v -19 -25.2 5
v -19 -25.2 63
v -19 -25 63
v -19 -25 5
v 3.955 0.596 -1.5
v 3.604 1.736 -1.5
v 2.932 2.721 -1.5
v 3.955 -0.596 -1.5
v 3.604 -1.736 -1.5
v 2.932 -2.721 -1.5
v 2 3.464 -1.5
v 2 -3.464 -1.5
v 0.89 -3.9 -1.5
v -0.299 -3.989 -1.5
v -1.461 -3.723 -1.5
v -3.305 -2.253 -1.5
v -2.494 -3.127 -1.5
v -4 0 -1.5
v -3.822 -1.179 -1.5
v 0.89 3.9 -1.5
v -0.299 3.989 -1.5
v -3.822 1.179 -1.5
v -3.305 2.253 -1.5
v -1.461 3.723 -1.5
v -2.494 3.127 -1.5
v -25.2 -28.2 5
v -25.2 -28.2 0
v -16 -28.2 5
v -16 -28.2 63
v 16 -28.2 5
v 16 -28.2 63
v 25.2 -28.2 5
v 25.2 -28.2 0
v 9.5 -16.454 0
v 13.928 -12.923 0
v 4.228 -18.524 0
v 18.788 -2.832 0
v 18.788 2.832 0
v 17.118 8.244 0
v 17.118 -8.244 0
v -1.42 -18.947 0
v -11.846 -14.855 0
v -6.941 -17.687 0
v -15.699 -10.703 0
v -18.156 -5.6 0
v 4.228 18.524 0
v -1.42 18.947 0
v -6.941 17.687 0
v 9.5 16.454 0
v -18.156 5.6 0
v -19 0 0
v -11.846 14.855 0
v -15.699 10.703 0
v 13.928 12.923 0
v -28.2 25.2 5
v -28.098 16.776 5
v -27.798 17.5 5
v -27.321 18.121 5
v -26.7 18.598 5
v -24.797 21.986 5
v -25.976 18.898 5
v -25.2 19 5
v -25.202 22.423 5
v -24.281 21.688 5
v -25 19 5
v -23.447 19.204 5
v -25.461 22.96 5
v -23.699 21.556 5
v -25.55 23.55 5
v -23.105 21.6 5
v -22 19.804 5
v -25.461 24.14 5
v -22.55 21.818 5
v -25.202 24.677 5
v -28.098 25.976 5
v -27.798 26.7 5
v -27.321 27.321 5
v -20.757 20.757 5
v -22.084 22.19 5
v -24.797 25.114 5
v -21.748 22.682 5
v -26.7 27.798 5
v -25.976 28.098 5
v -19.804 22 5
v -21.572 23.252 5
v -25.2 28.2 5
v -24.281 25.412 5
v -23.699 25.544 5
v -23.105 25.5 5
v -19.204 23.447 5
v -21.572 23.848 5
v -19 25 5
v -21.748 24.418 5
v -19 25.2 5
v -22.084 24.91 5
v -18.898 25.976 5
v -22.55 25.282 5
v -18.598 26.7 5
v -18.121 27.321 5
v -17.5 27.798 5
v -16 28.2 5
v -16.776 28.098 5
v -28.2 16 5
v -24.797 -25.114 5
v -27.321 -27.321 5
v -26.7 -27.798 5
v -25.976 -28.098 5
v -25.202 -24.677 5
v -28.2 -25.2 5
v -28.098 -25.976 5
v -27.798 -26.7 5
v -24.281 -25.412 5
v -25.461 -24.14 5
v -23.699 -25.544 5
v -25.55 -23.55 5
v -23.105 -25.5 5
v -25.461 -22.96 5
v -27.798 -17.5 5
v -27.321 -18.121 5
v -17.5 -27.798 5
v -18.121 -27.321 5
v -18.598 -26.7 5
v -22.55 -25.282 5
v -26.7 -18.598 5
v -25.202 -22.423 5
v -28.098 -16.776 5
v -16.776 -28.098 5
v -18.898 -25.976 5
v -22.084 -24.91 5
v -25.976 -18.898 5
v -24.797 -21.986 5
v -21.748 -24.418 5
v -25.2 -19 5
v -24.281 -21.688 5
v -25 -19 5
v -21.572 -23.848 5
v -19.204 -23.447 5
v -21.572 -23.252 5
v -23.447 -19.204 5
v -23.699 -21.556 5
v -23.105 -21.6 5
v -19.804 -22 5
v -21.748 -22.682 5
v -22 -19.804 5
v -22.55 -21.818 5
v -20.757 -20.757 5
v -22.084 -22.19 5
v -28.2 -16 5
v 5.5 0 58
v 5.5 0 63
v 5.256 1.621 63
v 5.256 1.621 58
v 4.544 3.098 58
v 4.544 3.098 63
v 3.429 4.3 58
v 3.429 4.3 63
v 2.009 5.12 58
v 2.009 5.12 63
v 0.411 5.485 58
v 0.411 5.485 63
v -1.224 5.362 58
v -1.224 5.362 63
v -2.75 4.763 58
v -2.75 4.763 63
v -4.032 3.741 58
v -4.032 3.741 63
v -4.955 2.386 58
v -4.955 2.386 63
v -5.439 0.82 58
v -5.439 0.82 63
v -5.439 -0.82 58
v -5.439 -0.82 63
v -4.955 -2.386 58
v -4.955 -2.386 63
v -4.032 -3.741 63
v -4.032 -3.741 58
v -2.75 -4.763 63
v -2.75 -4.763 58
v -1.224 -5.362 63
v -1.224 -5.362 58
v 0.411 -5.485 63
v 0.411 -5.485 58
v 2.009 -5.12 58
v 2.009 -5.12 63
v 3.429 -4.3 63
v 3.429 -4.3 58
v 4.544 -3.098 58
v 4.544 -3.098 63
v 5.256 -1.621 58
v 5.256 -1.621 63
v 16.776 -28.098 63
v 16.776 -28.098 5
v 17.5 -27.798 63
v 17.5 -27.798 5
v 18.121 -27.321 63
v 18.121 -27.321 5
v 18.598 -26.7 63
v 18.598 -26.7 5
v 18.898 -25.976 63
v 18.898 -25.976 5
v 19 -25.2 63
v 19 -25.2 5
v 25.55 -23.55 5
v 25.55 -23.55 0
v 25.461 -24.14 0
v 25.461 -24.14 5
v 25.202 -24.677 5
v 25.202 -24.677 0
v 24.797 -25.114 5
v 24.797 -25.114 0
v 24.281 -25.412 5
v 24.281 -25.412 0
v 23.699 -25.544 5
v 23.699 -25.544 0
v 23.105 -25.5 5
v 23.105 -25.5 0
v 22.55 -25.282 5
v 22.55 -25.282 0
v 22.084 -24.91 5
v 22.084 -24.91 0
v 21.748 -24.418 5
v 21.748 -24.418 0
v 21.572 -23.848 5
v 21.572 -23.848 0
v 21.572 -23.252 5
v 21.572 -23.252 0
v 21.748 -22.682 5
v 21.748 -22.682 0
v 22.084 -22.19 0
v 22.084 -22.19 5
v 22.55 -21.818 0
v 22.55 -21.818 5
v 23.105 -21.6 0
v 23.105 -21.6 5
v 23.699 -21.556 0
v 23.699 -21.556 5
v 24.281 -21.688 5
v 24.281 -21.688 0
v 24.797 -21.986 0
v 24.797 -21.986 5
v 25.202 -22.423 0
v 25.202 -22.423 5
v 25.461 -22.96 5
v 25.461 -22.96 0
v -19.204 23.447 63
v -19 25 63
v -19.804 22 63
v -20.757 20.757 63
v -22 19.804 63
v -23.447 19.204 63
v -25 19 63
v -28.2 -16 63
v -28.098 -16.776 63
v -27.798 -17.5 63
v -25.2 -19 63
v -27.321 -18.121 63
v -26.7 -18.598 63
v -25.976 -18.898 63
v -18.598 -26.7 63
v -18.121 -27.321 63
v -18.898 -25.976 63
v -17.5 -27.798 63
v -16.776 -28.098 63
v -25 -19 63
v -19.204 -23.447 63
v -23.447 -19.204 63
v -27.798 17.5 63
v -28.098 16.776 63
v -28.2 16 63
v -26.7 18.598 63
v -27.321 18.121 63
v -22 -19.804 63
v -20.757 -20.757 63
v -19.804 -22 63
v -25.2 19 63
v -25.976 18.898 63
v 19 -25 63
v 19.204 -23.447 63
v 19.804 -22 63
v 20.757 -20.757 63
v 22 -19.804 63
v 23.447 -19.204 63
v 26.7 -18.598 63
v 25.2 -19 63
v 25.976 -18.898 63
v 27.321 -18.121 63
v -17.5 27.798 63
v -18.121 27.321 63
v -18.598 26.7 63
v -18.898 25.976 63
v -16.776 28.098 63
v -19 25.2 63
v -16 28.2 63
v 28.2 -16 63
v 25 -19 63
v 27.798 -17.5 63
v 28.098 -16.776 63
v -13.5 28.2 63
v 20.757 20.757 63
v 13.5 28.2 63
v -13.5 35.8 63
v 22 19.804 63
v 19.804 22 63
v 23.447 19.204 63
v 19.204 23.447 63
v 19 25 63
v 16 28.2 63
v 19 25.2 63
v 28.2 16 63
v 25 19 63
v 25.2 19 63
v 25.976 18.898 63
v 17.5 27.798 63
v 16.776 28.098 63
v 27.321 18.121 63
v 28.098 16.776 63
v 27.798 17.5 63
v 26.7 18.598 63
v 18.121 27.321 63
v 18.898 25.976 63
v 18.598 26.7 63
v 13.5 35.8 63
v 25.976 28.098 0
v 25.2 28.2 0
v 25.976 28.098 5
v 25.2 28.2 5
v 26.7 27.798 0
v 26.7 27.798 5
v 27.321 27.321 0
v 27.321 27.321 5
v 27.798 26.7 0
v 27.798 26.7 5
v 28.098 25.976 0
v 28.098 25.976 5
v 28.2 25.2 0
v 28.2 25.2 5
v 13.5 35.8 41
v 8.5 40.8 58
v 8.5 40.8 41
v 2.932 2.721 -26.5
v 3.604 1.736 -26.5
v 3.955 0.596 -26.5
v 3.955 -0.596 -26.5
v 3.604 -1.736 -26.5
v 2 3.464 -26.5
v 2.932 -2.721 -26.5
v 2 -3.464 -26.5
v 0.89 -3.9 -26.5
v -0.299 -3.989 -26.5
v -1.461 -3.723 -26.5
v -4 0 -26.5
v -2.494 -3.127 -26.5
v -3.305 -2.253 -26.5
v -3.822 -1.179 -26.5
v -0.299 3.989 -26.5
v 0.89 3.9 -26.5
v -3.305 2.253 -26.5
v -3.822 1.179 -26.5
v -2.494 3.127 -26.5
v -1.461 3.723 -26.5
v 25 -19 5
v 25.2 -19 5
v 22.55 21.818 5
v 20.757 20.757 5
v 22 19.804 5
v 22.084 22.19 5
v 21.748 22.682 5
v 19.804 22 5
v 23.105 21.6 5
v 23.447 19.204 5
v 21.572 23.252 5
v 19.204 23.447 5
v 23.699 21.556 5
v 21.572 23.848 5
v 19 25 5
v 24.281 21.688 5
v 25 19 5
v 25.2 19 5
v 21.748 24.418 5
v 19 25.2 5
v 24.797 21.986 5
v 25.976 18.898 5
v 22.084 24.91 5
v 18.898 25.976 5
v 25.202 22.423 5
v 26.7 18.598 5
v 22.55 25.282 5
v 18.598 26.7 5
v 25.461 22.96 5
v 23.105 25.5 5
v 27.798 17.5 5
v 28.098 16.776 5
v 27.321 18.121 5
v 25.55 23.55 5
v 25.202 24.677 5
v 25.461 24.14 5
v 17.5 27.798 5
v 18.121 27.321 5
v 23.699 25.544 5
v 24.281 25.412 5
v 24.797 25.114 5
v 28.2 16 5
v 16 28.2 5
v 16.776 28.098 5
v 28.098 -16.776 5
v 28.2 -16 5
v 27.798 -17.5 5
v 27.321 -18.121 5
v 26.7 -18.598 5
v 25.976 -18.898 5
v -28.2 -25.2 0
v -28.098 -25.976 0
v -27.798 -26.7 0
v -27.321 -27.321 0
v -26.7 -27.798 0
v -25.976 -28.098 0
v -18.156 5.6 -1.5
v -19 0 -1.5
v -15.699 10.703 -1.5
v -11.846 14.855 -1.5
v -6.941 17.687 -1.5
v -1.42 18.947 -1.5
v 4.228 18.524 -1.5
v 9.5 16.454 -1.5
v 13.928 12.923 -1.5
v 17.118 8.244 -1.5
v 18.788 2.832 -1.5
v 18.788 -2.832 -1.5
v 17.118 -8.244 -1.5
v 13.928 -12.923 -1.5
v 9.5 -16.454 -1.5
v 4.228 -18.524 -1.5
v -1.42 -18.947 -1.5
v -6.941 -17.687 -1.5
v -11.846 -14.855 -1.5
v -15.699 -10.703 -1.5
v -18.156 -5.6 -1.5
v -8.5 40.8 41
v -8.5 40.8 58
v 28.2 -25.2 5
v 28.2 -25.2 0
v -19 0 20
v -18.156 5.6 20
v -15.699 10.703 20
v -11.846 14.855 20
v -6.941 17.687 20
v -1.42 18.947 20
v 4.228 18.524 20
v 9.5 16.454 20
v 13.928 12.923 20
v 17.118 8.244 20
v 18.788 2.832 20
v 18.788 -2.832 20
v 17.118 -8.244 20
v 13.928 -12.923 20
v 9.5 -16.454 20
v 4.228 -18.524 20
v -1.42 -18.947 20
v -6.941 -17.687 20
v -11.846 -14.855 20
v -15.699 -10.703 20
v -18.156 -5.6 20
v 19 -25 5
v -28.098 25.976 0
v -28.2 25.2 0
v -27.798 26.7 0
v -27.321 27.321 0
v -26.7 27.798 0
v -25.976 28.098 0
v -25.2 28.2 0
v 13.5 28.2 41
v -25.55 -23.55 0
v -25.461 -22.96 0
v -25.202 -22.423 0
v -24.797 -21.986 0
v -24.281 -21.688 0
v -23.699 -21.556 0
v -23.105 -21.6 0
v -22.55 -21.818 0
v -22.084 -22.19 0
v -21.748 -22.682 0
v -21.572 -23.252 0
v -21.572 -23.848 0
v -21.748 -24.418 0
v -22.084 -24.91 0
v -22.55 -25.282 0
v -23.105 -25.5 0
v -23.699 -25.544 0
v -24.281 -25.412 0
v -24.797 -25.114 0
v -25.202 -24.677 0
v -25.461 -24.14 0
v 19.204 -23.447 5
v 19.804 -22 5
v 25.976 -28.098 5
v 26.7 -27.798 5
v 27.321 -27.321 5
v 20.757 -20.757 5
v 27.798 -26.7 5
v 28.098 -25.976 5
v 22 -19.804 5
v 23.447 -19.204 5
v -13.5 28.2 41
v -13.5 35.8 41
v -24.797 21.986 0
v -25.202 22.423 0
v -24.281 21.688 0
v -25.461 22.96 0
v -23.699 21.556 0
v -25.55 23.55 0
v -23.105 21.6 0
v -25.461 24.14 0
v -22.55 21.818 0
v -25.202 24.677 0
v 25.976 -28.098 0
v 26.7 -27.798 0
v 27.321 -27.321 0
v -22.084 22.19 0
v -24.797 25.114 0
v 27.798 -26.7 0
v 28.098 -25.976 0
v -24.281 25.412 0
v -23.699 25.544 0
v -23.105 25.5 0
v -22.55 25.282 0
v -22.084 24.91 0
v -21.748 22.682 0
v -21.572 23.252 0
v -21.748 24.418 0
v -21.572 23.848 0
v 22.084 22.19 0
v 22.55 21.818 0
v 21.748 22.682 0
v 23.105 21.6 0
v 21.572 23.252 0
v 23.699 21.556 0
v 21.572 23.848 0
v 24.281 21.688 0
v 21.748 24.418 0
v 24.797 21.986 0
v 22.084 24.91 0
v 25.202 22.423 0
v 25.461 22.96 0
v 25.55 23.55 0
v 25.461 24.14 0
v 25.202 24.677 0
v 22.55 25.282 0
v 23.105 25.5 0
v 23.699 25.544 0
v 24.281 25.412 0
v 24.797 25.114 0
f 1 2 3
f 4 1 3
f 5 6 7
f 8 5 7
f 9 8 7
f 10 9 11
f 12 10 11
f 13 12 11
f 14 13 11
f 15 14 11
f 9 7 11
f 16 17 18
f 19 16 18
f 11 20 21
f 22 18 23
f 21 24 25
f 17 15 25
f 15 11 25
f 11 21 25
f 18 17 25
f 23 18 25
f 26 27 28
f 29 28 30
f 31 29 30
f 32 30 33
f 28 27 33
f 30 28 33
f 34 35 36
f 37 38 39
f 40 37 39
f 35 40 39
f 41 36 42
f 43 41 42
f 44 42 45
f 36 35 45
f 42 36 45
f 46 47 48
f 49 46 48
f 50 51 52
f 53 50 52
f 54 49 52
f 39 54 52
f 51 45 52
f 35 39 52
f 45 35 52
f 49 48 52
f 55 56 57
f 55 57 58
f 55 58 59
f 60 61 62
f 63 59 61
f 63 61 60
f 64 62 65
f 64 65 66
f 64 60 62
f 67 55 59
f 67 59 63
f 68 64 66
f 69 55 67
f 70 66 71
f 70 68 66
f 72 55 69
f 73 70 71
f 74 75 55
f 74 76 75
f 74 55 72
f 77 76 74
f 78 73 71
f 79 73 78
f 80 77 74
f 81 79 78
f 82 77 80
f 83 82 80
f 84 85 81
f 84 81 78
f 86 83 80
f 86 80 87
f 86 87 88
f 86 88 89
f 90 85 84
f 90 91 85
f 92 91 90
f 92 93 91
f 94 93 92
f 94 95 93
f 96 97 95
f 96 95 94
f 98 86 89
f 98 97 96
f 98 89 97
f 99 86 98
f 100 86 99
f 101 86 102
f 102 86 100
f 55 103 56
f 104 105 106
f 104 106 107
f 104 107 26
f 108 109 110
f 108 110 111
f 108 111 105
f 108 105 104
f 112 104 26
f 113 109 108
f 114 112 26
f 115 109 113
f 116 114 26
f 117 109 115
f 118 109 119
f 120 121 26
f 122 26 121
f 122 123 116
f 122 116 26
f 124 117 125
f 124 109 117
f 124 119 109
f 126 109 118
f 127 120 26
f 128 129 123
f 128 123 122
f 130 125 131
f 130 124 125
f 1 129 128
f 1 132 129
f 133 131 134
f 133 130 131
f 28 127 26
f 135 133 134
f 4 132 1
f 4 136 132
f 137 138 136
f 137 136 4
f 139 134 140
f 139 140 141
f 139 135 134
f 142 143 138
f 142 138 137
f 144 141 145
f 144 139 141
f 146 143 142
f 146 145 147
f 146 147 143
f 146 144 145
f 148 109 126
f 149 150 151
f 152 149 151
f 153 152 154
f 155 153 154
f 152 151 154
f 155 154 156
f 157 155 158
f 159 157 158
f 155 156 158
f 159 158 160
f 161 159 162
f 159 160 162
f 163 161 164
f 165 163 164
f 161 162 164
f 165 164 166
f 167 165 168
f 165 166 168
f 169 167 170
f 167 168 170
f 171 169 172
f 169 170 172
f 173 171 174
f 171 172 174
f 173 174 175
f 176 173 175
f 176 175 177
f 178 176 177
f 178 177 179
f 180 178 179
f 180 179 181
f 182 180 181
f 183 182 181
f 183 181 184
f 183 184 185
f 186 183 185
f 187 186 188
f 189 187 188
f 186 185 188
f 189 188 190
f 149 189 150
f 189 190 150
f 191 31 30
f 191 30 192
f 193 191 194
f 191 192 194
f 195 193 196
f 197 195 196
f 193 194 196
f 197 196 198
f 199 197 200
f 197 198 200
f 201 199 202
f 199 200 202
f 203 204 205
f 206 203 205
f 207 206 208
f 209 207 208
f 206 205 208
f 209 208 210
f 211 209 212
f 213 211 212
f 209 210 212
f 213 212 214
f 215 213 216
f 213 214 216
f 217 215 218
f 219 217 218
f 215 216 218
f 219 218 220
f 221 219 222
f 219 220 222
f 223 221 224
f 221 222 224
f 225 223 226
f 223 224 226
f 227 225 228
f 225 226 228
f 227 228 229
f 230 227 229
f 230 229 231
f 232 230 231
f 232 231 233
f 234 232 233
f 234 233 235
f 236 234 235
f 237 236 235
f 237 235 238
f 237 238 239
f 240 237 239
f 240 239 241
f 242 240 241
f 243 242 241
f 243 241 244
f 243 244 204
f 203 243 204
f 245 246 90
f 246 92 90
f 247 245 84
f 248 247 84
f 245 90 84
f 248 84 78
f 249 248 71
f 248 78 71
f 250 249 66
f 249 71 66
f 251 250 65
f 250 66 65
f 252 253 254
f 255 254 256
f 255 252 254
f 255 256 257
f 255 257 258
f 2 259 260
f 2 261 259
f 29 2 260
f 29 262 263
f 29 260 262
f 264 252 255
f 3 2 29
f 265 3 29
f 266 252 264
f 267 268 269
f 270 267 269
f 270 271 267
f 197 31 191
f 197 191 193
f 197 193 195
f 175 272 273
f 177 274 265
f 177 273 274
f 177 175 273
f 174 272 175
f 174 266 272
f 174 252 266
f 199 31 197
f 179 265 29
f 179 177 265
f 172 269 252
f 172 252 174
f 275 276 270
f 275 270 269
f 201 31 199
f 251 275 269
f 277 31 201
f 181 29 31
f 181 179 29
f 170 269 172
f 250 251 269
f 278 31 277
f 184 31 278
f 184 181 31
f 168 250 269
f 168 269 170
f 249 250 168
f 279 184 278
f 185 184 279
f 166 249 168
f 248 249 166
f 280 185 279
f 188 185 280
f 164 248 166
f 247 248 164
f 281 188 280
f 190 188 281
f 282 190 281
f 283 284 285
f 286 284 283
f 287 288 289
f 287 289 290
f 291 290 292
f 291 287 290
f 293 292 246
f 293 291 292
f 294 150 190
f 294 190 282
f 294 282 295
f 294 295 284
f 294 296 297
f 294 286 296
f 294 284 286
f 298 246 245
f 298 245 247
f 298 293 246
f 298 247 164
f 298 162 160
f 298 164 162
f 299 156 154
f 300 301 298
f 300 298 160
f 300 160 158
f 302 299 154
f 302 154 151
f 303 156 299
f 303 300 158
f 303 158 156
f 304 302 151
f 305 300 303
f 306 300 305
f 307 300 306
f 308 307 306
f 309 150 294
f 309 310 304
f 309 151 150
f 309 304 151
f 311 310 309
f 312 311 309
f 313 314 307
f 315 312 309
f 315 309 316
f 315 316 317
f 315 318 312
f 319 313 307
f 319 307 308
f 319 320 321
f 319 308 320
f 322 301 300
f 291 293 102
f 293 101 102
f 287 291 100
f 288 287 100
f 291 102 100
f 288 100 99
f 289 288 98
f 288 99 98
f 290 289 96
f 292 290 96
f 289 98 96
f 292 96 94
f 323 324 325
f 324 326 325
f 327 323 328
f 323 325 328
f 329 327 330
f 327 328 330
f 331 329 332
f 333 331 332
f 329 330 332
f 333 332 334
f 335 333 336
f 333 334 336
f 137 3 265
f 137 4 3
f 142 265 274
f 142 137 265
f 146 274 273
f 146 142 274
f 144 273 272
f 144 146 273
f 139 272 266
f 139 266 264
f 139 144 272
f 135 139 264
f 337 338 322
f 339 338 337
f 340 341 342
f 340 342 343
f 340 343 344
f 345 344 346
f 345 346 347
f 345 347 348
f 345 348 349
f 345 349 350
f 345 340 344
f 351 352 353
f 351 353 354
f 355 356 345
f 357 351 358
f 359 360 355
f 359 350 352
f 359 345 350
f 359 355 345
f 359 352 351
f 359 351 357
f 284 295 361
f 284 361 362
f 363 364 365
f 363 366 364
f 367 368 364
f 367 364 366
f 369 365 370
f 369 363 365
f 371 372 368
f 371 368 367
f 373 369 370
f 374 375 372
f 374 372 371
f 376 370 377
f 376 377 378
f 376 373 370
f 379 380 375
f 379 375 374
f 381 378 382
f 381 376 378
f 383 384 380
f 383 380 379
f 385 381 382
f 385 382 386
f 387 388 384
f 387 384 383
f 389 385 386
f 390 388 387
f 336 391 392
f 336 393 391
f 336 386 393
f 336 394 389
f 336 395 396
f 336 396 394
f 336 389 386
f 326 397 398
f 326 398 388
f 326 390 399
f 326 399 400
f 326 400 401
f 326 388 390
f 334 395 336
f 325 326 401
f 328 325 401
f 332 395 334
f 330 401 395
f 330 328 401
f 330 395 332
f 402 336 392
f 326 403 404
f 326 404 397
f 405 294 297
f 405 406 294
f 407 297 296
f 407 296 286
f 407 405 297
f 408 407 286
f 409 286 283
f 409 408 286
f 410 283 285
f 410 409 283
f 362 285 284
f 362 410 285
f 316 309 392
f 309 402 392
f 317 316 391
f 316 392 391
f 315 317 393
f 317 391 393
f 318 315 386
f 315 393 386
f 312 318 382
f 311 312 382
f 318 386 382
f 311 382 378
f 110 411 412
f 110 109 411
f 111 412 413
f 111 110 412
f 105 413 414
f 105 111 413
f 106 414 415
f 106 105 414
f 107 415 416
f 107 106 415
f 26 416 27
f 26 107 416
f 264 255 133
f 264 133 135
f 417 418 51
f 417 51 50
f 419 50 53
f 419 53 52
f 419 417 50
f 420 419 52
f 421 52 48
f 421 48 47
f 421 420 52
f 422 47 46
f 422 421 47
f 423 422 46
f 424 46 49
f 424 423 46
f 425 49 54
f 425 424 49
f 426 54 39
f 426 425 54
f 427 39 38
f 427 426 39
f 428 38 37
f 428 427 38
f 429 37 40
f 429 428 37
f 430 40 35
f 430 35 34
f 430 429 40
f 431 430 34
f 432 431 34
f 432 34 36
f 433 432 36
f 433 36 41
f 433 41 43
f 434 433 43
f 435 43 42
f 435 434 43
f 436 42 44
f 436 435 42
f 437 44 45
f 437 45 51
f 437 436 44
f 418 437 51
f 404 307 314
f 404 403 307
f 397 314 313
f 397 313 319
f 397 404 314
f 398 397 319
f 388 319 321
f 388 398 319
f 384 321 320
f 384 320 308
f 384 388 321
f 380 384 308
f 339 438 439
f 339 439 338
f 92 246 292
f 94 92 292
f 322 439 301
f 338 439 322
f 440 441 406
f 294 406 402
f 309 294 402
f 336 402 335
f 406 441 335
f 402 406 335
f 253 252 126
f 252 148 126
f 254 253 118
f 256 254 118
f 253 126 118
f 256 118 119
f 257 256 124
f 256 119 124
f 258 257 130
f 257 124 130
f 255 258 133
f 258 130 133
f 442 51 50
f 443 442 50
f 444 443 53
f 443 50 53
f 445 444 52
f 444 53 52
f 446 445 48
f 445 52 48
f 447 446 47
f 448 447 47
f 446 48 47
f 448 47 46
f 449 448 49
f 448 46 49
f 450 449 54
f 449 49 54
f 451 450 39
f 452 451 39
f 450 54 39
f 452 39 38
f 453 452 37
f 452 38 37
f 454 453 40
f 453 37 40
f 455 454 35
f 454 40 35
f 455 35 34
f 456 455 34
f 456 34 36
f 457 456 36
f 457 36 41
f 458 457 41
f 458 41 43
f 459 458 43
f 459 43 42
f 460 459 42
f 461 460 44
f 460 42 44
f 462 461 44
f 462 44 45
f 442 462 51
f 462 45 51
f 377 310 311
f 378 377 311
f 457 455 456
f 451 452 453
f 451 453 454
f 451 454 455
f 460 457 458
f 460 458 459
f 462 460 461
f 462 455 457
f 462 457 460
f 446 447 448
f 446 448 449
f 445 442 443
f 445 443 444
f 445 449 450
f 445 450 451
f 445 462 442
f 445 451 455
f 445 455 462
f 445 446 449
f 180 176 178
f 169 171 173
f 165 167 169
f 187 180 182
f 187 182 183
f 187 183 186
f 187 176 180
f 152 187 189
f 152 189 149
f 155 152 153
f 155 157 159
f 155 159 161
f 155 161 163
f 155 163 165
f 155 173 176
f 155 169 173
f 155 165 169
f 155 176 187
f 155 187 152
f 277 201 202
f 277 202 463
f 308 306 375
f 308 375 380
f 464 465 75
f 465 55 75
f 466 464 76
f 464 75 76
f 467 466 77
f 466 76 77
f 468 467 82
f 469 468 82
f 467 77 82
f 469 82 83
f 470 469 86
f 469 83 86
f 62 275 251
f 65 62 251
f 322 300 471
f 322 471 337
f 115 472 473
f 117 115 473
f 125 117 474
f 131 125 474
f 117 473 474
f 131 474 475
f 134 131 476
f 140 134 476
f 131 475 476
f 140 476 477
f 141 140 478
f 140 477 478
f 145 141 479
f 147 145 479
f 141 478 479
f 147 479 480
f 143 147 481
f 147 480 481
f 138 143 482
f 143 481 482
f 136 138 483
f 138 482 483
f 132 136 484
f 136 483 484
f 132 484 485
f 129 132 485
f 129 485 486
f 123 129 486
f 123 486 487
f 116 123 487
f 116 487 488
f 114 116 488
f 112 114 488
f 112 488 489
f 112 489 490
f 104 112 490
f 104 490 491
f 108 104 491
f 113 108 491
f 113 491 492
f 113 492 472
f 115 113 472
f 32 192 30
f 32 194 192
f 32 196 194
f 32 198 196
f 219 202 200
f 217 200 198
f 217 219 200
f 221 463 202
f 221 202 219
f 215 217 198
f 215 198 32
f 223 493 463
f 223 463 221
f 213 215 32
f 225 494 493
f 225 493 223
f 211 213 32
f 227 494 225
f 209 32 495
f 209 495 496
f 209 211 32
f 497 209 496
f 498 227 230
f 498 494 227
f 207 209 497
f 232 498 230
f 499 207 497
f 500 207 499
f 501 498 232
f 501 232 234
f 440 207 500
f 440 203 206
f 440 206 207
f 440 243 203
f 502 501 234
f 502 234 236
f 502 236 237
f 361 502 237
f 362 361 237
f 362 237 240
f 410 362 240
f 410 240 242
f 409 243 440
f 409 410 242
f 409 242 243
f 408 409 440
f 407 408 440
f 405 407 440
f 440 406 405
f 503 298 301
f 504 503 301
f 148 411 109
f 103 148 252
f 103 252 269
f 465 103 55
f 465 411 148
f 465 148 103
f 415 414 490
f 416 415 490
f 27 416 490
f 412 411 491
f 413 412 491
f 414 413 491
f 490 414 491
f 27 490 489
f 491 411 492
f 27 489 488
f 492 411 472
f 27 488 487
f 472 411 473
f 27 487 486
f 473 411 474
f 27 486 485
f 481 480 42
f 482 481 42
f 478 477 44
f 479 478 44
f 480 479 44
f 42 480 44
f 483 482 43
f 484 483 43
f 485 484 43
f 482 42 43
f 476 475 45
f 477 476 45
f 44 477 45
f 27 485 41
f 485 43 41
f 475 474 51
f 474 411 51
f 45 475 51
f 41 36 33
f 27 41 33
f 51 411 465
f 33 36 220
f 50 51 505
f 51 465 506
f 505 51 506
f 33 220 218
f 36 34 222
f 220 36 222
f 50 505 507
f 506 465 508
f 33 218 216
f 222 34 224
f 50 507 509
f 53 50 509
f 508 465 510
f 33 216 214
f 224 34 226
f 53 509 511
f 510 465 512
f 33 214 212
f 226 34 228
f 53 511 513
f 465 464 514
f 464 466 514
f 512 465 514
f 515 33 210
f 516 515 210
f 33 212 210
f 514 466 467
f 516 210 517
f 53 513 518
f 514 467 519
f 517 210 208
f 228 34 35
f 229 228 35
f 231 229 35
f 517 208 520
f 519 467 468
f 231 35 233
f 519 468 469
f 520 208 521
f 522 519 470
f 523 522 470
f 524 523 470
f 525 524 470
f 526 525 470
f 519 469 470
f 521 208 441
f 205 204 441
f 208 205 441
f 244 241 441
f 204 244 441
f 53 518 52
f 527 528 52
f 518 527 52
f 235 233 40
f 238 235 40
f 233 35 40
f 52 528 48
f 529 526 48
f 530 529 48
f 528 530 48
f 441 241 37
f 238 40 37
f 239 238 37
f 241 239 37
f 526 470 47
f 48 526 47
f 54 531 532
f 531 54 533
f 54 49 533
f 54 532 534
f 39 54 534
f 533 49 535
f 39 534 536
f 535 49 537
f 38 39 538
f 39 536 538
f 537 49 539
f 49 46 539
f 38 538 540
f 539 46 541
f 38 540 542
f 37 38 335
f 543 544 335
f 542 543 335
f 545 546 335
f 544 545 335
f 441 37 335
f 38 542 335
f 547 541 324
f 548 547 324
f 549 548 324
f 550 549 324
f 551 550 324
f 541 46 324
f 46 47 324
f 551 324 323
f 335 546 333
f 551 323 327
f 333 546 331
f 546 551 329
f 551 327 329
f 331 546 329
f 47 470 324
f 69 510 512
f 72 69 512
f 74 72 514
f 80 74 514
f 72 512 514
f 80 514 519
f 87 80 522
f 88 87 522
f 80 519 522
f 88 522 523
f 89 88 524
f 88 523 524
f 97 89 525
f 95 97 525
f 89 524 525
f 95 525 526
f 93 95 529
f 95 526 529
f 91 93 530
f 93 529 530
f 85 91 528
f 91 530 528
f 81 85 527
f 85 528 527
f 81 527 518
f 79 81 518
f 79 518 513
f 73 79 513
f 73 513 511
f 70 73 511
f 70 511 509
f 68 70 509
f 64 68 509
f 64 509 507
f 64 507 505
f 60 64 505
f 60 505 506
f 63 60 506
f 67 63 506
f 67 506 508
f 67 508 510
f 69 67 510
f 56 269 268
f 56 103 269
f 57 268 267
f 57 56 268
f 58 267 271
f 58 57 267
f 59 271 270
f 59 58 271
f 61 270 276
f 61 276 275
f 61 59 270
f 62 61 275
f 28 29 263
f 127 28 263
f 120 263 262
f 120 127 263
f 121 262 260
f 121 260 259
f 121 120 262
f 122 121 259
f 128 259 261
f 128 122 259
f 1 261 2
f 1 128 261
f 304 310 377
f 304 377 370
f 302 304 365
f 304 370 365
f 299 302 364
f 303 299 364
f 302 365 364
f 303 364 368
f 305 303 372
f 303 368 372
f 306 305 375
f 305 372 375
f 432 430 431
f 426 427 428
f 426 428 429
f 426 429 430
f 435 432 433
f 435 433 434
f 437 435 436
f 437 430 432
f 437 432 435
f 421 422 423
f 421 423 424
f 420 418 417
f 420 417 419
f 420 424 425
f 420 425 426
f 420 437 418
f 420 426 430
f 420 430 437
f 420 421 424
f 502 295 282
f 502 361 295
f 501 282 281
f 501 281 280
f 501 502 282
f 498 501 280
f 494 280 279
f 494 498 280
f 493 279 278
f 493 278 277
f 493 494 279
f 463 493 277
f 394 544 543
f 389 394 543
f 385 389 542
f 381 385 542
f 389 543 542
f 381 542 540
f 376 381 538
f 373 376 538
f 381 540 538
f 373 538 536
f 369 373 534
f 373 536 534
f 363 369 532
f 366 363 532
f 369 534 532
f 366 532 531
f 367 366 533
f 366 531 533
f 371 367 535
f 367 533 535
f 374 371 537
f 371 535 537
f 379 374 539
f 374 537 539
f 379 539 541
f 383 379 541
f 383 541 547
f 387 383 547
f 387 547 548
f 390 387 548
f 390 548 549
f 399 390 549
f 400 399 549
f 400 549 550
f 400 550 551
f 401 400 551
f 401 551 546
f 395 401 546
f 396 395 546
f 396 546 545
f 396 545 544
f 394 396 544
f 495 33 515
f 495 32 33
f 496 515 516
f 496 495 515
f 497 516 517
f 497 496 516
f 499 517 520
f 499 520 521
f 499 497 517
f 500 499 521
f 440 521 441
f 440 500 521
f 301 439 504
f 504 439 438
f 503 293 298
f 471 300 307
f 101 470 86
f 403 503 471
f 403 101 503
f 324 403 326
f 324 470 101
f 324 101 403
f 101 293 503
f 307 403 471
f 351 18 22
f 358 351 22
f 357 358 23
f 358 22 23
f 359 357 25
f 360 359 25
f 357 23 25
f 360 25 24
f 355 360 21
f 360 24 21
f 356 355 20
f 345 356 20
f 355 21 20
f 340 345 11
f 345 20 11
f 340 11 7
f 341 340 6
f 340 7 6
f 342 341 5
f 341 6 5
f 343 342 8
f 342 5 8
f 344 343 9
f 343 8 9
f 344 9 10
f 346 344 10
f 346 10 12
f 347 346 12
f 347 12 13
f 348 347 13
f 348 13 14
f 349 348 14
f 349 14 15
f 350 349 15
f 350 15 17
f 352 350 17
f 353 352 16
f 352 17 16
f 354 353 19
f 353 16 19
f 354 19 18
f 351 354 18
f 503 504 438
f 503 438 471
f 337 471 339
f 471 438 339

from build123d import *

# Parameters (mm, degrees)
SKETCH_1_W          = 56.4
SKETCH_1_H          = 56.4
EXTRUDE_1_DEPTH     = 63
SKETCH_2_R          = 2
CUT_EXTRUDE_1_DEPTH = 63
SKETCH_3_W          = 9.2
SKETCH_3_H          = 9.2
CUT_EXTRUDE_2_DEPTH = 58
FILLET_1_R          = 3
FILLET_2_R          = 6
SKETCH_7_R          = 19
CUT_EXTRUDE_4_DEPTH = 20
EXTRUDE_START       = 1.5
SKETCH_4_R          = 19
EXTRUDE_2_DEPTH     = 1.5
SKETCH_5_R          = 4
EXTRUDE_3_DEPTH     = 25
SKETCH_8_R          = 5.5
CUT_EXTRUDE_5_DEPTH = 5
SKETCH_11_W         = 27
SKETCH_11_H         = 12.6
EXTRUDE_4_DEPTH     = 22
CHAMFER_3_SIZE      = 5


with BuildPart() as part:
    # 草图1 → 凸台-拉伸1 (new body)
    with BuildSketch(Plane.XY):
        Rectangle(SKETCH_1_W, SKETCH_1_H)
    extrude(amount=EXTRUDE_1_DEPTH)

    # 草图2 → 切除-拉伸1 (cut)
    with BuildSketch(Plane(origin=(0, 0, 0), x_dir=(-1, 0, 0), z_dir=(0, 0, -1))):
        with Locations((23.55, 23.55)):
            Circle(SKETCH_2_R)
        with Locations((23.55, -23.55)):
            Circle(SKETCH_2_R)
        with Locations(Location((-23.55, -23.55, 0), (0, 0, 180))):
            Circle(SKETCH_2_R)
        with Locations(Location((-23.55, 23.55, 0), (0, 0, 180))):
            Circle(SKETCH_2_R)
    extrude(amount=-CUT_EXTRUDE_1_DEPTH, mode=Mode.SUBTRACT)

    # 草图3 → 切除-拉伸2 (cut)
    with BuildSketch(Plane.XY.offset(63)):
        with Locations((-23.6, -23.6)):
            Rectangle(SKETCH_3_W, SKETCH_3_H)
        with Locations((23.6, -23.6)):
            Rectangle(SKETCH_3_W, SKETCH_3_H)
        with Locations((-23.6, 23.6)):
            Rectangle(SKETCH_3_W, SKETCH_3_H)
        with Locations((23.6, 23.6)):
            Rectangle(SKETCH_3_W, SKETCH_3_H)
    extrude(amount=-CUT_EXTRUDE_2_DEPTH, mode=Mode.SUBTRACT)

    # 圆角1
    fillet_1_edges = [part.edges().sort_by_distance(p)[0] for p in [
        (28.2, -28.2, 2.5),
        (-28.2, -28.2, 2.5),
        (-28.2, 28.2, 2.5),
        (28.2, 28.2, 2.5),
        (19, -28.2, 34),
        (28.2, -19, 34),
        (-19, 28.2, 34),
        (-28.2, 19, 34),
        (-19, -28.2, 34),
        (-28.2, -19, 34),
        (19, 28.2, 34),
        (28.2, 19, 34),
    ]]
    fillet(fillet_1_edges, radius=FILLET_1_R)

    # 圆角2
    fillet_2_edges = [part.edges().sort_by_distance(p)[0] for p in [
        (19, -19, 34),
        (-19, 19, 34),
        (-19, -19, 34),
        (19, 19, 34),
    ]]
    fillet(fillet_2_edges, radius=FILLET_2_R)

    # 草图7 → 切除-拉伸4 (cut)
    with BuildSketch(Plane(origin=(0, 0, 0), x_dir=(-1, 0, 0), z_dir=(0, 0, -1))):
        Circle(SKETCH_7_R)
    extrude(amount=-CUT_EXTRUDE_4_DEPTH, mode=Mode.SUBTRACT)

    # 草图8 → 切除-拉伸5 (cut)
    with BuildSketch(Plane.XY.offset(63)):
        Circle(SKETCH_8_R)
    extrude(amount=-CUT_EXTRUDE_5_DEPTH, mode=Mode.SUBTRACT)

    # 草图11 → 凸台-拉伸4 (add)
    with BuildSketch(Plane.XY.offset(63)):
        with Locations((0, 34.5)):
            Rectangle(SKETCH_11_W, SKETCH_11_H)
    extrude(amount=-EXTRUDE_4_DEPTH)

    # 倒角3
    chamfer_3_edges = [part.edges().sort_by_distance(p)[0] for p in [
        (-13.5, 40.8, 52),
        (13.5, 40.8, 52),
        (0, 40.8, 63),
    ]]
    chamfer(chamfer_3_edges, length=CHAMFER_3_SIZE)


with BuildPart() as body_2:
    # 草图4 → 凸台-拉伸2 (new body)
    with BuildSketch(Plane(origin=(0, 0, 0), x_dir=(-1, 0, 0), z_dir=(0, 0, -1)).offset(EXTRUDE_START)):
        Circle(SKETCH_4_R)
    extrude(amount=-EXTRUDE_2_DEPTH)


with BuildPart() as body_3:
    # 草图5 → 凸台-拉伸3 (new body)
    with BuildSketch(Plane(origin=(0, 0, -1.5), x_dir=(-1, 0, 0), z_dir=(0, 0, -1))):
        Circle(SKETCH_5_R)
    extrude(amount=EXTRUDE_3_DEPTH)


solid = Compound([part.part, body_2.part, body_3.part])
